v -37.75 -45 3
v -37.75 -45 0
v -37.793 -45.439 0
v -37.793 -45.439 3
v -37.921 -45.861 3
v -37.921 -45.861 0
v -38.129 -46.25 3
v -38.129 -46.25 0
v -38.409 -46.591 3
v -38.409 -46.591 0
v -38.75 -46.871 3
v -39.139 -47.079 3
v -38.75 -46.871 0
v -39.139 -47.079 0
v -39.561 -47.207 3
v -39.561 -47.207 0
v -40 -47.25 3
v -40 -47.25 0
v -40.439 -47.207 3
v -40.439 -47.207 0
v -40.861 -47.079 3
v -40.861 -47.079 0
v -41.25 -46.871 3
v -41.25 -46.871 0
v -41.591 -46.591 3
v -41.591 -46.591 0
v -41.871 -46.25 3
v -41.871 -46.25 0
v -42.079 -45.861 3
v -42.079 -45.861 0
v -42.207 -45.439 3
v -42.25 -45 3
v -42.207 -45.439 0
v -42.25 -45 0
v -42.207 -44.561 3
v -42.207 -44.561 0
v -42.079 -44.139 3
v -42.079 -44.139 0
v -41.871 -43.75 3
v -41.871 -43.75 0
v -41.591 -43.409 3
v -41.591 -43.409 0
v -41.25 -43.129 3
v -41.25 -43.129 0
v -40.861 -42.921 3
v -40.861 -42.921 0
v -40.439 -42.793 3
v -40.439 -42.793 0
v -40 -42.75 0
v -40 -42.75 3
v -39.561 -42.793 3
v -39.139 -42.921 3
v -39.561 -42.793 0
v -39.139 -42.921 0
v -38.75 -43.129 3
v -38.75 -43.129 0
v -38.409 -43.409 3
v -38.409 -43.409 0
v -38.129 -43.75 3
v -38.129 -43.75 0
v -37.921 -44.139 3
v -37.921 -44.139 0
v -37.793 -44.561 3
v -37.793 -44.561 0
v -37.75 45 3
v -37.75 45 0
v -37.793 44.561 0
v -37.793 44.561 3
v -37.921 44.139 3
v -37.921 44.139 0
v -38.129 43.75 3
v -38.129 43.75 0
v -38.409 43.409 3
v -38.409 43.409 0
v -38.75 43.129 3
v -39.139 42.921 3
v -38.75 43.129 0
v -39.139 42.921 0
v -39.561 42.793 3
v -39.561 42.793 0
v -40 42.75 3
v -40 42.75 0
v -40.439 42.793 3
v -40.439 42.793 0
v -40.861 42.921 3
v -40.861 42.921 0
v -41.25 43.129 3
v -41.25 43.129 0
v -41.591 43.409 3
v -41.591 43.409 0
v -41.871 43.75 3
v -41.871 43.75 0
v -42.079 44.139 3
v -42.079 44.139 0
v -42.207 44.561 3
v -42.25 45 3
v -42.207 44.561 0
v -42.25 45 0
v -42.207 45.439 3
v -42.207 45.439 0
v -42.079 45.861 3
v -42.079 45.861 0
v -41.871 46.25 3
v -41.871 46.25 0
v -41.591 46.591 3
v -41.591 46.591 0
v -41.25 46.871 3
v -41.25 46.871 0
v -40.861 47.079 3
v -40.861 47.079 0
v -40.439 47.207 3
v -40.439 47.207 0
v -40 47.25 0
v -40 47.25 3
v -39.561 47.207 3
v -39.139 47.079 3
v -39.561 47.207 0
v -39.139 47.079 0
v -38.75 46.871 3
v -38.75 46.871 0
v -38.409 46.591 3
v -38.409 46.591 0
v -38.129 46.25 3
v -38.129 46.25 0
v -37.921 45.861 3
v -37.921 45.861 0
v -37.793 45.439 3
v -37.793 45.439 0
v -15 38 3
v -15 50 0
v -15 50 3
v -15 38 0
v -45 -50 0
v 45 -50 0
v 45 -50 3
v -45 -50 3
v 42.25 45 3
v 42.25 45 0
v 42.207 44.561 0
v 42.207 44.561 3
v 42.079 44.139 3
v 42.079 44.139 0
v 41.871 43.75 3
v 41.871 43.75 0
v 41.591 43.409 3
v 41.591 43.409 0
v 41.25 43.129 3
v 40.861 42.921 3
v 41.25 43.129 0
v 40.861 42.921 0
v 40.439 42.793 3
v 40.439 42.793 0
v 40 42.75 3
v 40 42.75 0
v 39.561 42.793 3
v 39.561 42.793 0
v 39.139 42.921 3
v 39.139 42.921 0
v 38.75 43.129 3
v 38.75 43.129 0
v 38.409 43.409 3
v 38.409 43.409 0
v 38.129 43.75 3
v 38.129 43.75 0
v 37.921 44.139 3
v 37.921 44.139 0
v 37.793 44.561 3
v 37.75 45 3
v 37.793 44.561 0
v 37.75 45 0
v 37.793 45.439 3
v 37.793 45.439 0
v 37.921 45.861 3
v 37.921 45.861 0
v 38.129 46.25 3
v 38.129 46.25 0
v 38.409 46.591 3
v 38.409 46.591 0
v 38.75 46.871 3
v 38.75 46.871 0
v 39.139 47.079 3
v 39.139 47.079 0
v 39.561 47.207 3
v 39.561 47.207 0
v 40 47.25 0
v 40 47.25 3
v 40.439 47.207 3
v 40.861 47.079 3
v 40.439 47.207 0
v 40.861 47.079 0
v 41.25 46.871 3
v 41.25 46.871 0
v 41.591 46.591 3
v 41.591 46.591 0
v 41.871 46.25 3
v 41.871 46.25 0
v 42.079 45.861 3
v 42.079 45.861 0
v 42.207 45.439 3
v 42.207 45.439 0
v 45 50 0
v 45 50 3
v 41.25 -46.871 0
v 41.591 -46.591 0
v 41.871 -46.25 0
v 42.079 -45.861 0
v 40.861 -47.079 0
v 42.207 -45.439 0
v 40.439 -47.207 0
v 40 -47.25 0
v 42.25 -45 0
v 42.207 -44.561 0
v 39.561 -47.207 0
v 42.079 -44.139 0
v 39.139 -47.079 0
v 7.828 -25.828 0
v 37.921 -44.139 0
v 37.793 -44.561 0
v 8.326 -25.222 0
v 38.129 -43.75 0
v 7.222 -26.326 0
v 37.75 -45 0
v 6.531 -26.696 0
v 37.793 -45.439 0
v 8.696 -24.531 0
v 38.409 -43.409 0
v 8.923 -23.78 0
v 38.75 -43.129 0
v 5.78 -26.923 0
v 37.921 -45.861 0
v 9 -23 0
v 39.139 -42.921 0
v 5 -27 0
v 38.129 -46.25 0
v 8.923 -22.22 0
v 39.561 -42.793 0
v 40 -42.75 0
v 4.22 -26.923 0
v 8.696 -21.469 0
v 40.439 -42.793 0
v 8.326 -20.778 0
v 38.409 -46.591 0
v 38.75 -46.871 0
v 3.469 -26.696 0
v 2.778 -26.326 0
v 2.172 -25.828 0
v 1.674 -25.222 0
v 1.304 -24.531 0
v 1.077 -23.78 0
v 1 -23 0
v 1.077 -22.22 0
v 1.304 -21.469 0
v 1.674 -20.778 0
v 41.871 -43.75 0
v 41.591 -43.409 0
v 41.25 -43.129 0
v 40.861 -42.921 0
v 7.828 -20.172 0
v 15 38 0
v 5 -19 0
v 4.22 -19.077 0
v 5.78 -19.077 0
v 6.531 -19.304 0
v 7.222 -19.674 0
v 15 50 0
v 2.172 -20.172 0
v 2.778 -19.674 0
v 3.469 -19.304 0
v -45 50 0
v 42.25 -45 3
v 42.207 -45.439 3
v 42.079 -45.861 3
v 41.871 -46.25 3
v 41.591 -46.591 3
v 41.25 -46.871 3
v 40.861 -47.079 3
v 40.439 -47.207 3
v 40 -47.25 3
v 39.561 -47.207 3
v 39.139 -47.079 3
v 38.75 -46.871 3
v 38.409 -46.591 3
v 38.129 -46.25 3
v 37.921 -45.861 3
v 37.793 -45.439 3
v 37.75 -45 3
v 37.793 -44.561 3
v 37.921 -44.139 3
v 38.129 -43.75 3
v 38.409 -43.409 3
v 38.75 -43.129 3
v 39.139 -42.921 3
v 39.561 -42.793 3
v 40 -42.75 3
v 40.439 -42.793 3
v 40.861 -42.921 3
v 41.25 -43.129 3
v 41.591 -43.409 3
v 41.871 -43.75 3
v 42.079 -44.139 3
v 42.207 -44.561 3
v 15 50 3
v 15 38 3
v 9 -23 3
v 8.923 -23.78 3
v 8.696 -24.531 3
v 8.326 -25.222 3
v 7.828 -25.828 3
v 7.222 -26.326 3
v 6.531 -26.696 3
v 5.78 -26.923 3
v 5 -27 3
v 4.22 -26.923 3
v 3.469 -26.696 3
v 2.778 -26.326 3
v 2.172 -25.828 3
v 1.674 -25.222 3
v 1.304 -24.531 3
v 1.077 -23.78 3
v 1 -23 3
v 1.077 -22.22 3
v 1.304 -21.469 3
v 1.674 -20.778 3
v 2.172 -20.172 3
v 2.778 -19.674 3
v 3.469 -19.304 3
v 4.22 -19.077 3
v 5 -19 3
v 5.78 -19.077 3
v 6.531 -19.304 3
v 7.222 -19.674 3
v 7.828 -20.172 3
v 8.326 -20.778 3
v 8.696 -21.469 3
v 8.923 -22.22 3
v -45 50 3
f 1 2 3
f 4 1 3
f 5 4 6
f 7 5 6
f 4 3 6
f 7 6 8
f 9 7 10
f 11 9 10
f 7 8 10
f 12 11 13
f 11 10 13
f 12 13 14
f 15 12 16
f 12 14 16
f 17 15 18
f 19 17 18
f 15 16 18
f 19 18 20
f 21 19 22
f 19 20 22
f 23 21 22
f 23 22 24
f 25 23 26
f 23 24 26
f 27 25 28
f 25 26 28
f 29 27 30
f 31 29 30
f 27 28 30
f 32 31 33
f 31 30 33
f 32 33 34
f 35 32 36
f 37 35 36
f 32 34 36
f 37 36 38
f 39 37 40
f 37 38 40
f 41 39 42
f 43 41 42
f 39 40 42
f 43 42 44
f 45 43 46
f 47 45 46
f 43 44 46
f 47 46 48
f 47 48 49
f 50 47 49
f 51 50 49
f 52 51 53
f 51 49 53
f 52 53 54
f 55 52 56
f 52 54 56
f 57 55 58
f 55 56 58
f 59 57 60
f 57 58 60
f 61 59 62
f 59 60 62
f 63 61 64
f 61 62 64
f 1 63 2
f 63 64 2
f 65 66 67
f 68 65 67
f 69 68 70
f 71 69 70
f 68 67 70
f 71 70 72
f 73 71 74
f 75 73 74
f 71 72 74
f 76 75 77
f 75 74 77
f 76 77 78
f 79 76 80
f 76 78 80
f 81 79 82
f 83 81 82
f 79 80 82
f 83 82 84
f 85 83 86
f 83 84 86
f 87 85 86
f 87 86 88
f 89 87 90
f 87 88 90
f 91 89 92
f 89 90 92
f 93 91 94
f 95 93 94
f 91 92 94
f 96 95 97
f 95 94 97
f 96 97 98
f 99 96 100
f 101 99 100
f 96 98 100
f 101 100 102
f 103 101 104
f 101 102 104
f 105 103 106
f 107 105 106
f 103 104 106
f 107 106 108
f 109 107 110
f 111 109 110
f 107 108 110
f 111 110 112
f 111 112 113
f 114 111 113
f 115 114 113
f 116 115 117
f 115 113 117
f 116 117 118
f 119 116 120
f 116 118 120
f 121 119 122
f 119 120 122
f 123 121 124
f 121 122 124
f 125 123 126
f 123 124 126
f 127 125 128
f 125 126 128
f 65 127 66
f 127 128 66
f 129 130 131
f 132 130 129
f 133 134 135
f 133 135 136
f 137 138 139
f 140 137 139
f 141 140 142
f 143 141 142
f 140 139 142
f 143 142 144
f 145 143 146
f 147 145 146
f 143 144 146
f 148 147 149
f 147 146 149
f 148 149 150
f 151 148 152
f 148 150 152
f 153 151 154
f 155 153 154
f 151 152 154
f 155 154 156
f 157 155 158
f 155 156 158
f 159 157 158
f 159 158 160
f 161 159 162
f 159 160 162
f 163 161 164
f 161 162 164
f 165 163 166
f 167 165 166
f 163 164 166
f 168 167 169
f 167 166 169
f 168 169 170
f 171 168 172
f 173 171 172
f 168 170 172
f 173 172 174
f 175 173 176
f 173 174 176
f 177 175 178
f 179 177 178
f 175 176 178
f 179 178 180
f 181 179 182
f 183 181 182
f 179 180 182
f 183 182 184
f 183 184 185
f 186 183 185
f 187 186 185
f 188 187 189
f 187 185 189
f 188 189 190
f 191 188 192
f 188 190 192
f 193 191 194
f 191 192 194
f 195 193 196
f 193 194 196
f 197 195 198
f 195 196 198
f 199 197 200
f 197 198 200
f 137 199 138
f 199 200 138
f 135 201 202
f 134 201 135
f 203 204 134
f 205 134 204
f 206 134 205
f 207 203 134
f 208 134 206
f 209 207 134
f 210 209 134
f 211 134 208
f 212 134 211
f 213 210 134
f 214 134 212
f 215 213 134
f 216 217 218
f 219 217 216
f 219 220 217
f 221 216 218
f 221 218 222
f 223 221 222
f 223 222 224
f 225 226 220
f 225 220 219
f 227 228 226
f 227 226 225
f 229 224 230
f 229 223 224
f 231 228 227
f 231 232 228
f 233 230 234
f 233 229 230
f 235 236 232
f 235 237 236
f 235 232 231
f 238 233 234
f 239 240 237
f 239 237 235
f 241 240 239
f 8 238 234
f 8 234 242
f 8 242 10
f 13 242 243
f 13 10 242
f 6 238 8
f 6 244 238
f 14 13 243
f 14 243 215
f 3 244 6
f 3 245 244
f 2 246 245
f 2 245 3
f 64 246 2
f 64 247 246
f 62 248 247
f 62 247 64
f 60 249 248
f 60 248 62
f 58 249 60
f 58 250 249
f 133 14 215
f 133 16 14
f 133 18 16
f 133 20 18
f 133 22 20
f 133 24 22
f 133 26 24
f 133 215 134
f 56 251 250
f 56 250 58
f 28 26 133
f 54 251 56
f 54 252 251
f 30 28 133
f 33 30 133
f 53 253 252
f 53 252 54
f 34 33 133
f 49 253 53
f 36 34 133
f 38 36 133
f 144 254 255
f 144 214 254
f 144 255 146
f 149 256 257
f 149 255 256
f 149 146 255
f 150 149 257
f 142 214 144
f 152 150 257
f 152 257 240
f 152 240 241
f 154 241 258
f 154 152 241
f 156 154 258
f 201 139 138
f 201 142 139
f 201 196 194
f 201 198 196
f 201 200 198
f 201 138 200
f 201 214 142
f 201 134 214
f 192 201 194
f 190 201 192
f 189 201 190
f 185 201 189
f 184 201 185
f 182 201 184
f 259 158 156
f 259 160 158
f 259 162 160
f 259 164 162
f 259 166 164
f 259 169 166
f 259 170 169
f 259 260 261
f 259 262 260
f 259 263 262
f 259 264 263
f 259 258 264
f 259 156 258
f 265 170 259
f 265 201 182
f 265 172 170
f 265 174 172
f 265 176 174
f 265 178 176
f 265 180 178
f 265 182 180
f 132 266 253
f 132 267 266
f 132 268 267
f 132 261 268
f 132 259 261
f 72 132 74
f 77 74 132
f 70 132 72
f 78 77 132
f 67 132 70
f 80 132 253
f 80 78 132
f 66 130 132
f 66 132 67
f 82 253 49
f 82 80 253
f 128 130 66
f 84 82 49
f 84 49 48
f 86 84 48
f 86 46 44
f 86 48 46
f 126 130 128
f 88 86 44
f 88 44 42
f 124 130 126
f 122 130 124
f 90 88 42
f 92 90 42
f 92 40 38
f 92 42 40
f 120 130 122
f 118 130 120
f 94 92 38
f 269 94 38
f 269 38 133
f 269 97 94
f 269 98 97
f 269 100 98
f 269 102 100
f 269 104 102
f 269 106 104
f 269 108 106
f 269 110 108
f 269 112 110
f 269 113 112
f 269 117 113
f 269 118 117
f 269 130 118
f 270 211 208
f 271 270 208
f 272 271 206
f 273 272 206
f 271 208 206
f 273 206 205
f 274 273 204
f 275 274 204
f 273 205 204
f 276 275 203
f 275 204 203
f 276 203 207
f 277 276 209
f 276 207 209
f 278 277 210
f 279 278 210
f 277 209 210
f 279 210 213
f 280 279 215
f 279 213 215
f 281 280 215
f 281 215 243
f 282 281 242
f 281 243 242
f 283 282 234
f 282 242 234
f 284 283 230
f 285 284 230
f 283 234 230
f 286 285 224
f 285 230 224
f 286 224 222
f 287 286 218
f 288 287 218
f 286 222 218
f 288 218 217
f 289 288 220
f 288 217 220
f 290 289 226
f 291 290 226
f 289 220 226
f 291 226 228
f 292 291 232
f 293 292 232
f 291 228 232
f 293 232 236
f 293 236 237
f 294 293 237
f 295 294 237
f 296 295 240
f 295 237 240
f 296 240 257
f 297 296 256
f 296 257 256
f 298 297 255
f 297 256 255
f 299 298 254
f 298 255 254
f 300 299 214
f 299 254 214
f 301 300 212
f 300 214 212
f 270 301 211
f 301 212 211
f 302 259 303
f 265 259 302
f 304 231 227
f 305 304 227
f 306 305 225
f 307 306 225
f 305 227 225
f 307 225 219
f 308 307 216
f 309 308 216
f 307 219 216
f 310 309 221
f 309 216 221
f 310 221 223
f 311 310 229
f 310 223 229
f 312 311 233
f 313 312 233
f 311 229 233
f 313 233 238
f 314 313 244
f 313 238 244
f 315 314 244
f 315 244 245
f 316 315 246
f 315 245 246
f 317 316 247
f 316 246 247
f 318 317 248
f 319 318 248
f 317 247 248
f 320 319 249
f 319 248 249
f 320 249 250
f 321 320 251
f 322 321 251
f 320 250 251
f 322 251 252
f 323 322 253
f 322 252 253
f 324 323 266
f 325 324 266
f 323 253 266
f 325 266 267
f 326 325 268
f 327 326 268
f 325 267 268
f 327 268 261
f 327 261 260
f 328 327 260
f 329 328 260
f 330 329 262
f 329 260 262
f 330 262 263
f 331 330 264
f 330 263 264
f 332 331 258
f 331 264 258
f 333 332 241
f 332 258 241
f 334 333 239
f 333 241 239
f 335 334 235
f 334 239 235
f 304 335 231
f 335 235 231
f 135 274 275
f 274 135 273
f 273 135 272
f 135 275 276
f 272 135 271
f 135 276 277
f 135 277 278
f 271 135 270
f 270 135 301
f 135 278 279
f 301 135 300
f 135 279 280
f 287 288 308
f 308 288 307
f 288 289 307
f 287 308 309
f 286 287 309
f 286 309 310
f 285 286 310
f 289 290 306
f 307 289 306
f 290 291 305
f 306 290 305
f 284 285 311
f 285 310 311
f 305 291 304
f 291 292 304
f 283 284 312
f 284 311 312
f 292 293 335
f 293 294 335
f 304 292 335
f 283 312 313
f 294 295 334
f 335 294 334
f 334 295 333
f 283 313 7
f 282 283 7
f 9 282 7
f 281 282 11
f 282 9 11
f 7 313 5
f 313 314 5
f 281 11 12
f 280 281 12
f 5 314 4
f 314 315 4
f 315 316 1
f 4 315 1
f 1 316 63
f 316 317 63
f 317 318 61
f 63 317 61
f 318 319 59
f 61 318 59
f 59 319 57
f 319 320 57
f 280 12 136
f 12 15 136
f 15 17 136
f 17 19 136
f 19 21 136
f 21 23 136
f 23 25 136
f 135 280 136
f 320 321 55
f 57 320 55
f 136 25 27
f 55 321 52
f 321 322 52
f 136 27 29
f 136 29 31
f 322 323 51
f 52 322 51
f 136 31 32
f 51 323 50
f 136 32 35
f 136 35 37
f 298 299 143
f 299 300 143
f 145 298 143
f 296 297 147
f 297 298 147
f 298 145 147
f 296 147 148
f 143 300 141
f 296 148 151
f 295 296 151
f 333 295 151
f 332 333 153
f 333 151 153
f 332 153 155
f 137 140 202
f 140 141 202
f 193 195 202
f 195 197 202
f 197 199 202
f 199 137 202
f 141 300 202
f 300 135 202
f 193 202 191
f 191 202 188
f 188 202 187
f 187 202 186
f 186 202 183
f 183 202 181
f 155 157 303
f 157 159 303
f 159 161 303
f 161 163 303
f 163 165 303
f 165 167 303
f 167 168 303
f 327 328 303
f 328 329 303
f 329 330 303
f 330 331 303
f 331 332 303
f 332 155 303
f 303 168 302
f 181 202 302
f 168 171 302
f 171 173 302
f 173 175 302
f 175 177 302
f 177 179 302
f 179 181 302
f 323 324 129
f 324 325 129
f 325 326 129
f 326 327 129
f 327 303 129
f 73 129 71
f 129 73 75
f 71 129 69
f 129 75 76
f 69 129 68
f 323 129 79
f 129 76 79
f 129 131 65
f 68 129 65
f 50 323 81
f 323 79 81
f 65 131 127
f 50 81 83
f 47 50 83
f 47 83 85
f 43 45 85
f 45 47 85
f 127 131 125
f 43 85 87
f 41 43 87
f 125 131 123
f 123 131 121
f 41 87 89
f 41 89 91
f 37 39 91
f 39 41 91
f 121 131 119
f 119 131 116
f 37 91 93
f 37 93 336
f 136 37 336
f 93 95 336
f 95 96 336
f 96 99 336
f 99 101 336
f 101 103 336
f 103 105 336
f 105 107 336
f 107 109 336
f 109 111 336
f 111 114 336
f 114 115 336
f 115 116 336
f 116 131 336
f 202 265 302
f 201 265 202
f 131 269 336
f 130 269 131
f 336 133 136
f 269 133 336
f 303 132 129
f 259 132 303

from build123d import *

# Parameters (mm, degrees)
SKETCH1_R           = 4
SKETCH1_R_2         = 2.25
BOSS_EXTRUDE1_DEPTH = 3


with BuildPart() as part:
    # Sketch1 → Boss-Extrude1 (new body)
    with BuildSketch(Plane(origin=(0, 0, 0), x_dir=(-1, 0, 0), z_dir=(0, 0, -1))):
        Polygon((15, 50), (15, 38), (-15, 38), (-15, 50), (-45, 50), (-45, -50), (45, -50), (45, 50), align=None)
        with Locations(Location((-5, -23, 0), (0, 0, 180))):
            Circle(SKETCH1_R, mode=Mode.SUBTRACT)
        with Locations(Location((40, 45, 0), (0, 0, 180))):
            Circle(SKETCH1_R_2, mode=Mode.SUBTRACT)
        with Locations(Location((-40, 45, 0), (0, 0, 180))):
            Circle(SKETCH1_R_2, mode=Mode.SUBTRACT)
        with Locations(Location((-40, -45, 0), (0, 0, 180))):
            Circle(SKETCH1_R_2, mode=Mode.SUBTRACT)
        with Locations(Location((40, -45, 0), (0, 0, 180))):
            Circle(SKETCH1_R_2, mode=Mode.SUBTRACT)
    extrude(amount=-BOSS_EXTRUDE1_DEPTH)


solid = part.part
